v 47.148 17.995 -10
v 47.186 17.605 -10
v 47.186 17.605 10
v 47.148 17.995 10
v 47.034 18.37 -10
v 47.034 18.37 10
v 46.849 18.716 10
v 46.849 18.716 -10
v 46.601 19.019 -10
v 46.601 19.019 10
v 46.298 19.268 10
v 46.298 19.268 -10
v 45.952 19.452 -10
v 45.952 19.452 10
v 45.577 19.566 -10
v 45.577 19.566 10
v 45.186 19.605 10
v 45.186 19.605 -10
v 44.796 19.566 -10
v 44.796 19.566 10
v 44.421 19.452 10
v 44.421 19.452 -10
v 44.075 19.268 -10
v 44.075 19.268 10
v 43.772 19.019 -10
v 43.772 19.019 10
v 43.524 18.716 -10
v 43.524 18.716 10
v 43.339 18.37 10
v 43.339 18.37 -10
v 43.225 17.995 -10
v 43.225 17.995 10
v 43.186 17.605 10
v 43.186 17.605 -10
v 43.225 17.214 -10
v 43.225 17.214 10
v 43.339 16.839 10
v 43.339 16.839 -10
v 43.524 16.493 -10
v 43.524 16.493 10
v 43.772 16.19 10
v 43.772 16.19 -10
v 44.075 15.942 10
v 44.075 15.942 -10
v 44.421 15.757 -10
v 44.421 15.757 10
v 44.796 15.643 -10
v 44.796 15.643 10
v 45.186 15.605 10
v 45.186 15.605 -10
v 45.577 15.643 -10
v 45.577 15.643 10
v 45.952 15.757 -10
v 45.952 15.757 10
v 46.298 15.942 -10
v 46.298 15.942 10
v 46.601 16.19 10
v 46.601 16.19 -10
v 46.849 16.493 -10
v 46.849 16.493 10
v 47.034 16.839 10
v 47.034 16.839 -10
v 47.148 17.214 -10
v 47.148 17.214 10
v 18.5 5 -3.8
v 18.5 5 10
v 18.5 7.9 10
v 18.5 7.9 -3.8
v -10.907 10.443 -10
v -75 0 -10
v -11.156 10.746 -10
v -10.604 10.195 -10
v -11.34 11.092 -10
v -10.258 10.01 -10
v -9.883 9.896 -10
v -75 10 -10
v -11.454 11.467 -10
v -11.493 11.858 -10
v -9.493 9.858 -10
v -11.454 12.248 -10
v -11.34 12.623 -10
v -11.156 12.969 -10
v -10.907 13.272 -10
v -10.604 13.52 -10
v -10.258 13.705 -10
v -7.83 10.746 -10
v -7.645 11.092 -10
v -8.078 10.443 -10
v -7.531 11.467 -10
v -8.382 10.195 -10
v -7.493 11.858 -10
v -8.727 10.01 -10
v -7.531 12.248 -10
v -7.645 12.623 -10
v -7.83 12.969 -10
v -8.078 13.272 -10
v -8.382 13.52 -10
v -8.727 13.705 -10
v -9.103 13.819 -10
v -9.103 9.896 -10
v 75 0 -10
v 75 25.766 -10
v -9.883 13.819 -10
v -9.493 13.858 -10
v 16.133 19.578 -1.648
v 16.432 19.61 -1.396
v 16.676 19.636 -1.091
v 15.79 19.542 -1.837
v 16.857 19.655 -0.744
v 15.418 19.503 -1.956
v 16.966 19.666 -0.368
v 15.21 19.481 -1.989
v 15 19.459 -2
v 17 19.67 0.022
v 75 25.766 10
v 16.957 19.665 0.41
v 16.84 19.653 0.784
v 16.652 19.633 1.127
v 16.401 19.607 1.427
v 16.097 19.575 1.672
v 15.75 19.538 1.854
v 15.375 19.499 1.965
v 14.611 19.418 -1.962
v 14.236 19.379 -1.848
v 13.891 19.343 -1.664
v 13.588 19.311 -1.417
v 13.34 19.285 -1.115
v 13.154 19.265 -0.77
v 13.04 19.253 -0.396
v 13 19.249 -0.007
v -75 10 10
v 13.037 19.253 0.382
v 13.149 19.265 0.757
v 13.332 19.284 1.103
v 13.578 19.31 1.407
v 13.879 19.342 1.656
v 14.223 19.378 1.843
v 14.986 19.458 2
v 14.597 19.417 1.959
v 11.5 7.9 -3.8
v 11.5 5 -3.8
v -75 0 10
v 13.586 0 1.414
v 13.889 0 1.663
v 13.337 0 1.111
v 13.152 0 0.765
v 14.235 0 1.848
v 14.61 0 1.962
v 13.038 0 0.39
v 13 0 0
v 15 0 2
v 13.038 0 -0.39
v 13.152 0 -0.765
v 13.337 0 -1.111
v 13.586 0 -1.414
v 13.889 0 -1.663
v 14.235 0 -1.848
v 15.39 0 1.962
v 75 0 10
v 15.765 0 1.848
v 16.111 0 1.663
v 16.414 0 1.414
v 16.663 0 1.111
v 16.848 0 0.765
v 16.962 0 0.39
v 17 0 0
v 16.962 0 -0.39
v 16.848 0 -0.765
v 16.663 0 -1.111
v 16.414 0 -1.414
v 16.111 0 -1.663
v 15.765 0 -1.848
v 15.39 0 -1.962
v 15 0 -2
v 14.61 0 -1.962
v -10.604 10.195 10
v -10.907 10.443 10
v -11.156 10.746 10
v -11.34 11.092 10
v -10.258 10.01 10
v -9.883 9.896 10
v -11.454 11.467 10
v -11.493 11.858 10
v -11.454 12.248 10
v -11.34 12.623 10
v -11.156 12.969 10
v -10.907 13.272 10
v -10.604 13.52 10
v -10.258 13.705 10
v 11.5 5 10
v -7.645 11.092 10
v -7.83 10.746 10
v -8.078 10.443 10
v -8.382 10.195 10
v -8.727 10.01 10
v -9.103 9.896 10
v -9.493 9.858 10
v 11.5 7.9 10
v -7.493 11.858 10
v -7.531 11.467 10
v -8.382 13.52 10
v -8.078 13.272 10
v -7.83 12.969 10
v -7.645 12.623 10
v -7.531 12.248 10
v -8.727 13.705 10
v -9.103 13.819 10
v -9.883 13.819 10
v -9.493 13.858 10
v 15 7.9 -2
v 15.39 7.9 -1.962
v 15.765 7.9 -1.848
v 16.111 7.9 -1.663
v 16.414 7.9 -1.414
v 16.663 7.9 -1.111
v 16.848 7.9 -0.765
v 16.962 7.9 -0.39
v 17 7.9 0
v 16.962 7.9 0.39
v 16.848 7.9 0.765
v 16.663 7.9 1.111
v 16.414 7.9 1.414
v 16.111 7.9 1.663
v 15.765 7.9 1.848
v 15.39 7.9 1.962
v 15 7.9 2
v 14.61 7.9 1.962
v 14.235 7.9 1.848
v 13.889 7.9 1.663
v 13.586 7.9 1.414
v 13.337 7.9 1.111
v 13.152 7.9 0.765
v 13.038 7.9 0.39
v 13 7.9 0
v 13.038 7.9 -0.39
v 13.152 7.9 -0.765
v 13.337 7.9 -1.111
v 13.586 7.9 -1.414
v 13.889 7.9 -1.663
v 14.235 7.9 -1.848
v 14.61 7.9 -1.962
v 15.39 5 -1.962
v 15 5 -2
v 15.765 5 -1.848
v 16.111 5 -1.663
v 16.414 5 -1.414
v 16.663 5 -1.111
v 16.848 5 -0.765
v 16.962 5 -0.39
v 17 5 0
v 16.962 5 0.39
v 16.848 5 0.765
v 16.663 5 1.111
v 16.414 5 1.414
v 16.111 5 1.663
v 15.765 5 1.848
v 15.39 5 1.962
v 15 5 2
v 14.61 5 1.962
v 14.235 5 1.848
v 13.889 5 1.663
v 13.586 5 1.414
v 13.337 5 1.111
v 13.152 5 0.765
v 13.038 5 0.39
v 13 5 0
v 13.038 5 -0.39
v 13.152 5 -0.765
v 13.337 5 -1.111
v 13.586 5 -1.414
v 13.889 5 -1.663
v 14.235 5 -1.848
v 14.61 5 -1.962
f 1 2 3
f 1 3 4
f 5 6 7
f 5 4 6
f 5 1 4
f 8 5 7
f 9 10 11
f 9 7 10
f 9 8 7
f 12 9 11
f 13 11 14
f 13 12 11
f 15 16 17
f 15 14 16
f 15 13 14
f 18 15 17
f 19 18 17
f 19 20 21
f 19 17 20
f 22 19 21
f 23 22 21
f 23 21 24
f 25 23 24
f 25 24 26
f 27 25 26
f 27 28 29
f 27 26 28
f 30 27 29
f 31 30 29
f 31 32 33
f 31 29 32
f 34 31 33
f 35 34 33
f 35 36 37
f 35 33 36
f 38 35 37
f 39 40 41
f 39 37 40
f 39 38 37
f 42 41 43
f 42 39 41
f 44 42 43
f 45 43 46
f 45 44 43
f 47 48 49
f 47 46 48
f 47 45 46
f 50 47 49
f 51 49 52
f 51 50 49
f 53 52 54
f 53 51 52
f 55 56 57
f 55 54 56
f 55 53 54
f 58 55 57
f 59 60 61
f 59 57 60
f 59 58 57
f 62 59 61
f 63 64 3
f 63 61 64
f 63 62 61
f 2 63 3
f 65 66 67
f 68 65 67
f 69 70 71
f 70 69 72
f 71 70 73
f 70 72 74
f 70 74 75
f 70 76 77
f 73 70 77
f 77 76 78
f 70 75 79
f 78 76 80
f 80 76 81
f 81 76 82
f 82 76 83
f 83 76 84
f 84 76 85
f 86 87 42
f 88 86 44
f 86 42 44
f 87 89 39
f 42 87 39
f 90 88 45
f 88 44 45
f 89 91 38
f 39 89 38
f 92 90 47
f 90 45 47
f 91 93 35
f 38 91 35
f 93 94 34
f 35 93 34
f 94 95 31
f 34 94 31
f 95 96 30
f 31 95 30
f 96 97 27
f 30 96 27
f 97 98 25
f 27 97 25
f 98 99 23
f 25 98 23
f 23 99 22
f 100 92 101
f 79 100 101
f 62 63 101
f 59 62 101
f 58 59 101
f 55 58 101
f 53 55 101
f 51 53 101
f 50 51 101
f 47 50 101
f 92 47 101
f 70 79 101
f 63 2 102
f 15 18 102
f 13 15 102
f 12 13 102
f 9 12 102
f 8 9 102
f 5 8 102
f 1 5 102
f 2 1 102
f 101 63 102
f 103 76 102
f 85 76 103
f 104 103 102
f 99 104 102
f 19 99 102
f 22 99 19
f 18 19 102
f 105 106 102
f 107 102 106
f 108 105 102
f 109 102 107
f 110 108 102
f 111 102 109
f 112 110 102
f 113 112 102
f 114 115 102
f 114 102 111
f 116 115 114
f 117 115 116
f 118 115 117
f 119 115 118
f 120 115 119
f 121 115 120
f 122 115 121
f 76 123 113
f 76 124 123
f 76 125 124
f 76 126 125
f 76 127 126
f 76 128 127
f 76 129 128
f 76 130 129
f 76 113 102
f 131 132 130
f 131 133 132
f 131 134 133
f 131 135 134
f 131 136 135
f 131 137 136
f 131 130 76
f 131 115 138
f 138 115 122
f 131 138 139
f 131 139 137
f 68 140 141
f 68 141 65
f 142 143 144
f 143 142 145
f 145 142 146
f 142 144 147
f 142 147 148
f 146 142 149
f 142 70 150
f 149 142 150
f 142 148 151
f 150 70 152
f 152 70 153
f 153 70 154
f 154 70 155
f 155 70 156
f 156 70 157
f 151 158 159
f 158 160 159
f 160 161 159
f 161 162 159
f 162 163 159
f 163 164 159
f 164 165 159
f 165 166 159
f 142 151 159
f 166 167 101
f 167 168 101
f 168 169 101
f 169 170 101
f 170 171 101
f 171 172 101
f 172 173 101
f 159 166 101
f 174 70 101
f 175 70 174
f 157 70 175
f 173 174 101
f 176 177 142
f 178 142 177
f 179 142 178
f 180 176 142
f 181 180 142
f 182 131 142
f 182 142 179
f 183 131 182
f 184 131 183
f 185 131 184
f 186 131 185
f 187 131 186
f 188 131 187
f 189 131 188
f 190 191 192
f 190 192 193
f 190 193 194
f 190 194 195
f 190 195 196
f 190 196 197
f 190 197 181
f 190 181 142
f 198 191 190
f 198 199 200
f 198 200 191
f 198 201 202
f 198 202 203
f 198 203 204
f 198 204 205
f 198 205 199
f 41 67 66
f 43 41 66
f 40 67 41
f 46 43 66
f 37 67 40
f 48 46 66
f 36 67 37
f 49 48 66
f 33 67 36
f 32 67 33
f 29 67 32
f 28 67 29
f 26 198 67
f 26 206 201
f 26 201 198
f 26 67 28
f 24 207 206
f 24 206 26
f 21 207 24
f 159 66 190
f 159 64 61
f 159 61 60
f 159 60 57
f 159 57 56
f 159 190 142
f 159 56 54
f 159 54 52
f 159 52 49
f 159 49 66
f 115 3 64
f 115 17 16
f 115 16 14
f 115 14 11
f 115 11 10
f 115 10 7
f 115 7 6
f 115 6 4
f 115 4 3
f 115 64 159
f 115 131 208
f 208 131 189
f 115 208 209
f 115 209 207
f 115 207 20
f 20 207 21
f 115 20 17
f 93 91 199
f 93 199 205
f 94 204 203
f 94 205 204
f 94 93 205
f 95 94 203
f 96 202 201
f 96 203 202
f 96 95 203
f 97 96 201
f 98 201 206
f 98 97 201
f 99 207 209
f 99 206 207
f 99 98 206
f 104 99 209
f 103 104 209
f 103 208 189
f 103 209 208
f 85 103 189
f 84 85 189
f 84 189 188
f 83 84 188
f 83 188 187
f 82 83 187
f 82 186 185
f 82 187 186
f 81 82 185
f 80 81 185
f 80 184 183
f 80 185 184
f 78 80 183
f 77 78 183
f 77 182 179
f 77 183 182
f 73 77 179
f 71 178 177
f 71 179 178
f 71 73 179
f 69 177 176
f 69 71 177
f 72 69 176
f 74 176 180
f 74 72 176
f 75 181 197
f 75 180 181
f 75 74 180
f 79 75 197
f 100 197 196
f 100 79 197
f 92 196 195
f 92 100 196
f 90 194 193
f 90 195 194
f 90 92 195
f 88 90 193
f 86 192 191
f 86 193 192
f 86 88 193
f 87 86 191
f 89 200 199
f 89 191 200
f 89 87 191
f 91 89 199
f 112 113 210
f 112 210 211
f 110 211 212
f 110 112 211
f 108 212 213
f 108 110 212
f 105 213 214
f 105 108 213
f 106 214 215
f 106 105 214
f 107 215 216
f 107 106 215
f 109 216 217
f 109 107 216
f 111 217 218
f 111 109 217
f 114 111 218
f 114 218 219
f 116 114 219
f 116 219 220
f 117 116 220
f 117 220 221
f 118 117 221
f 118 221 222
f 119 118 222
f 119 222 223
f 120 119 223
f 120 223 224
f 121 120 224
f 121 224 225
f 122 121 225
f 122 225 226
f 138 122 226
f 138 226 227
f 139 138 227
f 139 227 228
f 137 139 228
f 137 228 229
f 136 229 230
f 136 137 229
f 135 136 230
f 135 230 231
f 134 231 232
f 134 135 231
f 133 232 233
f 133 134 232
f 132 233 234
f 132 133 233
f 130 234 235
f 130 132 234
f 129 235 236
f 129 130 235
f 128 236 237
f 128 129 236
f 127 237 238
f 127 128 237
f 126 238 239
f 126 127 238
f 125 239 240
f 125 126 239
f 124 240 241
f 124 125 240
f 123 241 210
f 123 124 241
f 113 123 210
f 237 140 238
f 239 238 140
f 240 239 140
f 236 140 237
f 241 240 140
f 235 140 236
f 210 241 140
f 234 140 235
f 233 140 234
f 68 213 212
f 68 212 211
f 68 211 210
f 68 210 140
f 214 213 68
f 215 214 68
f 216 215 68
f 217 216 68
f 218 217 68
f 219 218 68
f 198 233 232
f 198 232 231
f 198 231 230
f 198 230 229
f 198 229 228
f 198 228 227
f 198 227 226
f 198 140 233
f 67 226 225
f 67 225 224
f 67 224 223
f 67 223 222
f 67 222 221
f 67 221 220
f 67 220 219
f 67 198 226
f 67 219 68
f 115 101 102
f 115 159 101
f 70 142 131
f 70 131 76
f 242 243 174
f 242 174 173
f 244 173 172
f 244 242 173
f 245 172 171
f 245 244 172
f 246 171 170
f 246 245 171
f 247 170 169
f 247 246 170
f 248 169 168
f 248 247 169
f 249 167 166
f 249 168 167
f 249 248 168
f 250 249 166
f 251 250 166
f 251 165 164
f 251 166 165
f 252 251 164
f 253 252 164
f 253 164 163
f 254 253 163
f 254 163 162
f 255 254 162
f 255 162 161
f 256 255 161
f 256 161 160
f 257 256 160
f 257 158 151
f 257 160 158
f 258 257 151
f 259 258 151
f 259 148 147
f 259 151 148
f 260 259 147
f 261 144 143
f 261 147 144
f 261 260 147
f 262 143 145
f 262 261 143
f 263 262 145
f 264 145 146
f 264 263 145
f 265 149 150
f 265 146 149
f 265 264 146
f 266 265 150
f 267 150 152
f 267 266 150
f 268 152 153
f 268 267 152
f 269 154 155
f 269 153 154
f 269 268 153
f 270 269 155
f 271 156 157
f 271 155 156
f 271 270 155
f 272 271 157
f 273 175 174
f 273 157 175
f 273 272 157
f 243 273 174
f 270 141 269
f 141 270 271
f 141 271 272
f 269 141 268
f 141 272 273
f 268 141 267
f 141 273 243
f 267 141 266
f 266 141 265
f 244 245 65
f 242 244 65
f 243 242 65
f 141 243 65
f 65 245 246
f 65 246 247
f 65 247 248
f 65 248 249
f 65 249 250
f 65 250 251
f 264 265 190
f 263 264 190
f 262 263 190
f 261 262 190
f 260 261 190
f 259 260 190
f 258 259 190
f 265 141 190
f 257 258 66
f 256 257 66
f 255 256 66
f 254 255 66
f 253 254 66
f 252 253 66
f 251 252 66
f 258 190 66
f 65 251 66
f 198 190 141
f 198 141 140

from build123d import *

# Parameters (mm, degrees)
SKETCH1_W               = 150
SKETCH1_H               = 20
BOSS_EXTRUDE1_DEPTH     = 10
BOSS_EXTRUDE2_DEPTH     = 10
CUT_EXTRUDE1_DEPTH      = 80.930394481
CUT_EXTRUDE1_DEPTH_BACK = 80.930394481
SKETCH3_R               = 2
SKETCH4_W               = 7
SKETCH4_H               = 2.9
CUT_EXTRUDE2_DEPTH      = 13.8
CUT_EXTRUDE3_DEPTH      = 82.785499704
CUT_EXTRUDE3_DEPTH_BACK = 82.785499704
SKETCH4_3_R             = 2


with BuildPart() as part:
    # Sketch1 → Boss-Extrude1 (new body)
    with BuildSketch(Plane(origin=(0, 0, 0), x_dir=(1, 0, 0), z_dir=(0, 1, 0))):
        Rectangle(SKETCH1_W, SKETCH1_H)
    extrude(amount=BOSS_EXTRUDE1_DEPTH)

    # Sketch2 → Boss-Extrude2 (add, symmetric)
    with BuildSketch(Plane.XY):
        Polygon((-75, 10), (75, 10), (75, 25.76563529), align=None)
    extrude(amount=BOSS_EXTRUDE2_DEPTH, both=True)

    # Sketch3 → Cut-Extrude1 (cut, two sides: drawn at the far end of the back side and taken through both)
    with BuildSketch(Plane.XZ.offset(-CUT_EXTRUDE1_DEPTH_BACK)):
        with Locations((15, 0)):
            Circle(SKETCH3_R)
    extrude(amount=CUT_EXTRUDE1_DEPTH + CUT_EXTRUDE1_DEPTH_BACK, mode=Mode.SUBTRACT)

    # Sketch4 → Cut-Extrude2 (cut)
    with BuildSketch(Plane.XY.offset(10)):
        with Locations((15, 6.45)):
            Rectangle(SKETCH4_W, SKETCH4_H)
    extrude(amount=-CUT_EXTRUDE2_DEPTH, mode=Mode.SUBTRACT)

    # Sketch4<3> → Cut-Extrude3 (cut, two sides: drawn at the far end of the back side and taken through both)
    with BuildSketch(Plane.XY.offset(10).offset(-CUT_EXTRUDE3_DEPTH_BACK)):
        with Locations((-9.492687022, 11.857554637)):
            Circle(SKETCH4_3_R)
        with Locations((45.186458968, 17.604564461)):
            Circle(SKETCH4_3_R)
    extrude(amount=CUT_EXTRUDE3_DEPTH + CUT_EXTRUDE3_DEPTH_BACK, mode=Mode.SUBTRACT)


solid = part.part
